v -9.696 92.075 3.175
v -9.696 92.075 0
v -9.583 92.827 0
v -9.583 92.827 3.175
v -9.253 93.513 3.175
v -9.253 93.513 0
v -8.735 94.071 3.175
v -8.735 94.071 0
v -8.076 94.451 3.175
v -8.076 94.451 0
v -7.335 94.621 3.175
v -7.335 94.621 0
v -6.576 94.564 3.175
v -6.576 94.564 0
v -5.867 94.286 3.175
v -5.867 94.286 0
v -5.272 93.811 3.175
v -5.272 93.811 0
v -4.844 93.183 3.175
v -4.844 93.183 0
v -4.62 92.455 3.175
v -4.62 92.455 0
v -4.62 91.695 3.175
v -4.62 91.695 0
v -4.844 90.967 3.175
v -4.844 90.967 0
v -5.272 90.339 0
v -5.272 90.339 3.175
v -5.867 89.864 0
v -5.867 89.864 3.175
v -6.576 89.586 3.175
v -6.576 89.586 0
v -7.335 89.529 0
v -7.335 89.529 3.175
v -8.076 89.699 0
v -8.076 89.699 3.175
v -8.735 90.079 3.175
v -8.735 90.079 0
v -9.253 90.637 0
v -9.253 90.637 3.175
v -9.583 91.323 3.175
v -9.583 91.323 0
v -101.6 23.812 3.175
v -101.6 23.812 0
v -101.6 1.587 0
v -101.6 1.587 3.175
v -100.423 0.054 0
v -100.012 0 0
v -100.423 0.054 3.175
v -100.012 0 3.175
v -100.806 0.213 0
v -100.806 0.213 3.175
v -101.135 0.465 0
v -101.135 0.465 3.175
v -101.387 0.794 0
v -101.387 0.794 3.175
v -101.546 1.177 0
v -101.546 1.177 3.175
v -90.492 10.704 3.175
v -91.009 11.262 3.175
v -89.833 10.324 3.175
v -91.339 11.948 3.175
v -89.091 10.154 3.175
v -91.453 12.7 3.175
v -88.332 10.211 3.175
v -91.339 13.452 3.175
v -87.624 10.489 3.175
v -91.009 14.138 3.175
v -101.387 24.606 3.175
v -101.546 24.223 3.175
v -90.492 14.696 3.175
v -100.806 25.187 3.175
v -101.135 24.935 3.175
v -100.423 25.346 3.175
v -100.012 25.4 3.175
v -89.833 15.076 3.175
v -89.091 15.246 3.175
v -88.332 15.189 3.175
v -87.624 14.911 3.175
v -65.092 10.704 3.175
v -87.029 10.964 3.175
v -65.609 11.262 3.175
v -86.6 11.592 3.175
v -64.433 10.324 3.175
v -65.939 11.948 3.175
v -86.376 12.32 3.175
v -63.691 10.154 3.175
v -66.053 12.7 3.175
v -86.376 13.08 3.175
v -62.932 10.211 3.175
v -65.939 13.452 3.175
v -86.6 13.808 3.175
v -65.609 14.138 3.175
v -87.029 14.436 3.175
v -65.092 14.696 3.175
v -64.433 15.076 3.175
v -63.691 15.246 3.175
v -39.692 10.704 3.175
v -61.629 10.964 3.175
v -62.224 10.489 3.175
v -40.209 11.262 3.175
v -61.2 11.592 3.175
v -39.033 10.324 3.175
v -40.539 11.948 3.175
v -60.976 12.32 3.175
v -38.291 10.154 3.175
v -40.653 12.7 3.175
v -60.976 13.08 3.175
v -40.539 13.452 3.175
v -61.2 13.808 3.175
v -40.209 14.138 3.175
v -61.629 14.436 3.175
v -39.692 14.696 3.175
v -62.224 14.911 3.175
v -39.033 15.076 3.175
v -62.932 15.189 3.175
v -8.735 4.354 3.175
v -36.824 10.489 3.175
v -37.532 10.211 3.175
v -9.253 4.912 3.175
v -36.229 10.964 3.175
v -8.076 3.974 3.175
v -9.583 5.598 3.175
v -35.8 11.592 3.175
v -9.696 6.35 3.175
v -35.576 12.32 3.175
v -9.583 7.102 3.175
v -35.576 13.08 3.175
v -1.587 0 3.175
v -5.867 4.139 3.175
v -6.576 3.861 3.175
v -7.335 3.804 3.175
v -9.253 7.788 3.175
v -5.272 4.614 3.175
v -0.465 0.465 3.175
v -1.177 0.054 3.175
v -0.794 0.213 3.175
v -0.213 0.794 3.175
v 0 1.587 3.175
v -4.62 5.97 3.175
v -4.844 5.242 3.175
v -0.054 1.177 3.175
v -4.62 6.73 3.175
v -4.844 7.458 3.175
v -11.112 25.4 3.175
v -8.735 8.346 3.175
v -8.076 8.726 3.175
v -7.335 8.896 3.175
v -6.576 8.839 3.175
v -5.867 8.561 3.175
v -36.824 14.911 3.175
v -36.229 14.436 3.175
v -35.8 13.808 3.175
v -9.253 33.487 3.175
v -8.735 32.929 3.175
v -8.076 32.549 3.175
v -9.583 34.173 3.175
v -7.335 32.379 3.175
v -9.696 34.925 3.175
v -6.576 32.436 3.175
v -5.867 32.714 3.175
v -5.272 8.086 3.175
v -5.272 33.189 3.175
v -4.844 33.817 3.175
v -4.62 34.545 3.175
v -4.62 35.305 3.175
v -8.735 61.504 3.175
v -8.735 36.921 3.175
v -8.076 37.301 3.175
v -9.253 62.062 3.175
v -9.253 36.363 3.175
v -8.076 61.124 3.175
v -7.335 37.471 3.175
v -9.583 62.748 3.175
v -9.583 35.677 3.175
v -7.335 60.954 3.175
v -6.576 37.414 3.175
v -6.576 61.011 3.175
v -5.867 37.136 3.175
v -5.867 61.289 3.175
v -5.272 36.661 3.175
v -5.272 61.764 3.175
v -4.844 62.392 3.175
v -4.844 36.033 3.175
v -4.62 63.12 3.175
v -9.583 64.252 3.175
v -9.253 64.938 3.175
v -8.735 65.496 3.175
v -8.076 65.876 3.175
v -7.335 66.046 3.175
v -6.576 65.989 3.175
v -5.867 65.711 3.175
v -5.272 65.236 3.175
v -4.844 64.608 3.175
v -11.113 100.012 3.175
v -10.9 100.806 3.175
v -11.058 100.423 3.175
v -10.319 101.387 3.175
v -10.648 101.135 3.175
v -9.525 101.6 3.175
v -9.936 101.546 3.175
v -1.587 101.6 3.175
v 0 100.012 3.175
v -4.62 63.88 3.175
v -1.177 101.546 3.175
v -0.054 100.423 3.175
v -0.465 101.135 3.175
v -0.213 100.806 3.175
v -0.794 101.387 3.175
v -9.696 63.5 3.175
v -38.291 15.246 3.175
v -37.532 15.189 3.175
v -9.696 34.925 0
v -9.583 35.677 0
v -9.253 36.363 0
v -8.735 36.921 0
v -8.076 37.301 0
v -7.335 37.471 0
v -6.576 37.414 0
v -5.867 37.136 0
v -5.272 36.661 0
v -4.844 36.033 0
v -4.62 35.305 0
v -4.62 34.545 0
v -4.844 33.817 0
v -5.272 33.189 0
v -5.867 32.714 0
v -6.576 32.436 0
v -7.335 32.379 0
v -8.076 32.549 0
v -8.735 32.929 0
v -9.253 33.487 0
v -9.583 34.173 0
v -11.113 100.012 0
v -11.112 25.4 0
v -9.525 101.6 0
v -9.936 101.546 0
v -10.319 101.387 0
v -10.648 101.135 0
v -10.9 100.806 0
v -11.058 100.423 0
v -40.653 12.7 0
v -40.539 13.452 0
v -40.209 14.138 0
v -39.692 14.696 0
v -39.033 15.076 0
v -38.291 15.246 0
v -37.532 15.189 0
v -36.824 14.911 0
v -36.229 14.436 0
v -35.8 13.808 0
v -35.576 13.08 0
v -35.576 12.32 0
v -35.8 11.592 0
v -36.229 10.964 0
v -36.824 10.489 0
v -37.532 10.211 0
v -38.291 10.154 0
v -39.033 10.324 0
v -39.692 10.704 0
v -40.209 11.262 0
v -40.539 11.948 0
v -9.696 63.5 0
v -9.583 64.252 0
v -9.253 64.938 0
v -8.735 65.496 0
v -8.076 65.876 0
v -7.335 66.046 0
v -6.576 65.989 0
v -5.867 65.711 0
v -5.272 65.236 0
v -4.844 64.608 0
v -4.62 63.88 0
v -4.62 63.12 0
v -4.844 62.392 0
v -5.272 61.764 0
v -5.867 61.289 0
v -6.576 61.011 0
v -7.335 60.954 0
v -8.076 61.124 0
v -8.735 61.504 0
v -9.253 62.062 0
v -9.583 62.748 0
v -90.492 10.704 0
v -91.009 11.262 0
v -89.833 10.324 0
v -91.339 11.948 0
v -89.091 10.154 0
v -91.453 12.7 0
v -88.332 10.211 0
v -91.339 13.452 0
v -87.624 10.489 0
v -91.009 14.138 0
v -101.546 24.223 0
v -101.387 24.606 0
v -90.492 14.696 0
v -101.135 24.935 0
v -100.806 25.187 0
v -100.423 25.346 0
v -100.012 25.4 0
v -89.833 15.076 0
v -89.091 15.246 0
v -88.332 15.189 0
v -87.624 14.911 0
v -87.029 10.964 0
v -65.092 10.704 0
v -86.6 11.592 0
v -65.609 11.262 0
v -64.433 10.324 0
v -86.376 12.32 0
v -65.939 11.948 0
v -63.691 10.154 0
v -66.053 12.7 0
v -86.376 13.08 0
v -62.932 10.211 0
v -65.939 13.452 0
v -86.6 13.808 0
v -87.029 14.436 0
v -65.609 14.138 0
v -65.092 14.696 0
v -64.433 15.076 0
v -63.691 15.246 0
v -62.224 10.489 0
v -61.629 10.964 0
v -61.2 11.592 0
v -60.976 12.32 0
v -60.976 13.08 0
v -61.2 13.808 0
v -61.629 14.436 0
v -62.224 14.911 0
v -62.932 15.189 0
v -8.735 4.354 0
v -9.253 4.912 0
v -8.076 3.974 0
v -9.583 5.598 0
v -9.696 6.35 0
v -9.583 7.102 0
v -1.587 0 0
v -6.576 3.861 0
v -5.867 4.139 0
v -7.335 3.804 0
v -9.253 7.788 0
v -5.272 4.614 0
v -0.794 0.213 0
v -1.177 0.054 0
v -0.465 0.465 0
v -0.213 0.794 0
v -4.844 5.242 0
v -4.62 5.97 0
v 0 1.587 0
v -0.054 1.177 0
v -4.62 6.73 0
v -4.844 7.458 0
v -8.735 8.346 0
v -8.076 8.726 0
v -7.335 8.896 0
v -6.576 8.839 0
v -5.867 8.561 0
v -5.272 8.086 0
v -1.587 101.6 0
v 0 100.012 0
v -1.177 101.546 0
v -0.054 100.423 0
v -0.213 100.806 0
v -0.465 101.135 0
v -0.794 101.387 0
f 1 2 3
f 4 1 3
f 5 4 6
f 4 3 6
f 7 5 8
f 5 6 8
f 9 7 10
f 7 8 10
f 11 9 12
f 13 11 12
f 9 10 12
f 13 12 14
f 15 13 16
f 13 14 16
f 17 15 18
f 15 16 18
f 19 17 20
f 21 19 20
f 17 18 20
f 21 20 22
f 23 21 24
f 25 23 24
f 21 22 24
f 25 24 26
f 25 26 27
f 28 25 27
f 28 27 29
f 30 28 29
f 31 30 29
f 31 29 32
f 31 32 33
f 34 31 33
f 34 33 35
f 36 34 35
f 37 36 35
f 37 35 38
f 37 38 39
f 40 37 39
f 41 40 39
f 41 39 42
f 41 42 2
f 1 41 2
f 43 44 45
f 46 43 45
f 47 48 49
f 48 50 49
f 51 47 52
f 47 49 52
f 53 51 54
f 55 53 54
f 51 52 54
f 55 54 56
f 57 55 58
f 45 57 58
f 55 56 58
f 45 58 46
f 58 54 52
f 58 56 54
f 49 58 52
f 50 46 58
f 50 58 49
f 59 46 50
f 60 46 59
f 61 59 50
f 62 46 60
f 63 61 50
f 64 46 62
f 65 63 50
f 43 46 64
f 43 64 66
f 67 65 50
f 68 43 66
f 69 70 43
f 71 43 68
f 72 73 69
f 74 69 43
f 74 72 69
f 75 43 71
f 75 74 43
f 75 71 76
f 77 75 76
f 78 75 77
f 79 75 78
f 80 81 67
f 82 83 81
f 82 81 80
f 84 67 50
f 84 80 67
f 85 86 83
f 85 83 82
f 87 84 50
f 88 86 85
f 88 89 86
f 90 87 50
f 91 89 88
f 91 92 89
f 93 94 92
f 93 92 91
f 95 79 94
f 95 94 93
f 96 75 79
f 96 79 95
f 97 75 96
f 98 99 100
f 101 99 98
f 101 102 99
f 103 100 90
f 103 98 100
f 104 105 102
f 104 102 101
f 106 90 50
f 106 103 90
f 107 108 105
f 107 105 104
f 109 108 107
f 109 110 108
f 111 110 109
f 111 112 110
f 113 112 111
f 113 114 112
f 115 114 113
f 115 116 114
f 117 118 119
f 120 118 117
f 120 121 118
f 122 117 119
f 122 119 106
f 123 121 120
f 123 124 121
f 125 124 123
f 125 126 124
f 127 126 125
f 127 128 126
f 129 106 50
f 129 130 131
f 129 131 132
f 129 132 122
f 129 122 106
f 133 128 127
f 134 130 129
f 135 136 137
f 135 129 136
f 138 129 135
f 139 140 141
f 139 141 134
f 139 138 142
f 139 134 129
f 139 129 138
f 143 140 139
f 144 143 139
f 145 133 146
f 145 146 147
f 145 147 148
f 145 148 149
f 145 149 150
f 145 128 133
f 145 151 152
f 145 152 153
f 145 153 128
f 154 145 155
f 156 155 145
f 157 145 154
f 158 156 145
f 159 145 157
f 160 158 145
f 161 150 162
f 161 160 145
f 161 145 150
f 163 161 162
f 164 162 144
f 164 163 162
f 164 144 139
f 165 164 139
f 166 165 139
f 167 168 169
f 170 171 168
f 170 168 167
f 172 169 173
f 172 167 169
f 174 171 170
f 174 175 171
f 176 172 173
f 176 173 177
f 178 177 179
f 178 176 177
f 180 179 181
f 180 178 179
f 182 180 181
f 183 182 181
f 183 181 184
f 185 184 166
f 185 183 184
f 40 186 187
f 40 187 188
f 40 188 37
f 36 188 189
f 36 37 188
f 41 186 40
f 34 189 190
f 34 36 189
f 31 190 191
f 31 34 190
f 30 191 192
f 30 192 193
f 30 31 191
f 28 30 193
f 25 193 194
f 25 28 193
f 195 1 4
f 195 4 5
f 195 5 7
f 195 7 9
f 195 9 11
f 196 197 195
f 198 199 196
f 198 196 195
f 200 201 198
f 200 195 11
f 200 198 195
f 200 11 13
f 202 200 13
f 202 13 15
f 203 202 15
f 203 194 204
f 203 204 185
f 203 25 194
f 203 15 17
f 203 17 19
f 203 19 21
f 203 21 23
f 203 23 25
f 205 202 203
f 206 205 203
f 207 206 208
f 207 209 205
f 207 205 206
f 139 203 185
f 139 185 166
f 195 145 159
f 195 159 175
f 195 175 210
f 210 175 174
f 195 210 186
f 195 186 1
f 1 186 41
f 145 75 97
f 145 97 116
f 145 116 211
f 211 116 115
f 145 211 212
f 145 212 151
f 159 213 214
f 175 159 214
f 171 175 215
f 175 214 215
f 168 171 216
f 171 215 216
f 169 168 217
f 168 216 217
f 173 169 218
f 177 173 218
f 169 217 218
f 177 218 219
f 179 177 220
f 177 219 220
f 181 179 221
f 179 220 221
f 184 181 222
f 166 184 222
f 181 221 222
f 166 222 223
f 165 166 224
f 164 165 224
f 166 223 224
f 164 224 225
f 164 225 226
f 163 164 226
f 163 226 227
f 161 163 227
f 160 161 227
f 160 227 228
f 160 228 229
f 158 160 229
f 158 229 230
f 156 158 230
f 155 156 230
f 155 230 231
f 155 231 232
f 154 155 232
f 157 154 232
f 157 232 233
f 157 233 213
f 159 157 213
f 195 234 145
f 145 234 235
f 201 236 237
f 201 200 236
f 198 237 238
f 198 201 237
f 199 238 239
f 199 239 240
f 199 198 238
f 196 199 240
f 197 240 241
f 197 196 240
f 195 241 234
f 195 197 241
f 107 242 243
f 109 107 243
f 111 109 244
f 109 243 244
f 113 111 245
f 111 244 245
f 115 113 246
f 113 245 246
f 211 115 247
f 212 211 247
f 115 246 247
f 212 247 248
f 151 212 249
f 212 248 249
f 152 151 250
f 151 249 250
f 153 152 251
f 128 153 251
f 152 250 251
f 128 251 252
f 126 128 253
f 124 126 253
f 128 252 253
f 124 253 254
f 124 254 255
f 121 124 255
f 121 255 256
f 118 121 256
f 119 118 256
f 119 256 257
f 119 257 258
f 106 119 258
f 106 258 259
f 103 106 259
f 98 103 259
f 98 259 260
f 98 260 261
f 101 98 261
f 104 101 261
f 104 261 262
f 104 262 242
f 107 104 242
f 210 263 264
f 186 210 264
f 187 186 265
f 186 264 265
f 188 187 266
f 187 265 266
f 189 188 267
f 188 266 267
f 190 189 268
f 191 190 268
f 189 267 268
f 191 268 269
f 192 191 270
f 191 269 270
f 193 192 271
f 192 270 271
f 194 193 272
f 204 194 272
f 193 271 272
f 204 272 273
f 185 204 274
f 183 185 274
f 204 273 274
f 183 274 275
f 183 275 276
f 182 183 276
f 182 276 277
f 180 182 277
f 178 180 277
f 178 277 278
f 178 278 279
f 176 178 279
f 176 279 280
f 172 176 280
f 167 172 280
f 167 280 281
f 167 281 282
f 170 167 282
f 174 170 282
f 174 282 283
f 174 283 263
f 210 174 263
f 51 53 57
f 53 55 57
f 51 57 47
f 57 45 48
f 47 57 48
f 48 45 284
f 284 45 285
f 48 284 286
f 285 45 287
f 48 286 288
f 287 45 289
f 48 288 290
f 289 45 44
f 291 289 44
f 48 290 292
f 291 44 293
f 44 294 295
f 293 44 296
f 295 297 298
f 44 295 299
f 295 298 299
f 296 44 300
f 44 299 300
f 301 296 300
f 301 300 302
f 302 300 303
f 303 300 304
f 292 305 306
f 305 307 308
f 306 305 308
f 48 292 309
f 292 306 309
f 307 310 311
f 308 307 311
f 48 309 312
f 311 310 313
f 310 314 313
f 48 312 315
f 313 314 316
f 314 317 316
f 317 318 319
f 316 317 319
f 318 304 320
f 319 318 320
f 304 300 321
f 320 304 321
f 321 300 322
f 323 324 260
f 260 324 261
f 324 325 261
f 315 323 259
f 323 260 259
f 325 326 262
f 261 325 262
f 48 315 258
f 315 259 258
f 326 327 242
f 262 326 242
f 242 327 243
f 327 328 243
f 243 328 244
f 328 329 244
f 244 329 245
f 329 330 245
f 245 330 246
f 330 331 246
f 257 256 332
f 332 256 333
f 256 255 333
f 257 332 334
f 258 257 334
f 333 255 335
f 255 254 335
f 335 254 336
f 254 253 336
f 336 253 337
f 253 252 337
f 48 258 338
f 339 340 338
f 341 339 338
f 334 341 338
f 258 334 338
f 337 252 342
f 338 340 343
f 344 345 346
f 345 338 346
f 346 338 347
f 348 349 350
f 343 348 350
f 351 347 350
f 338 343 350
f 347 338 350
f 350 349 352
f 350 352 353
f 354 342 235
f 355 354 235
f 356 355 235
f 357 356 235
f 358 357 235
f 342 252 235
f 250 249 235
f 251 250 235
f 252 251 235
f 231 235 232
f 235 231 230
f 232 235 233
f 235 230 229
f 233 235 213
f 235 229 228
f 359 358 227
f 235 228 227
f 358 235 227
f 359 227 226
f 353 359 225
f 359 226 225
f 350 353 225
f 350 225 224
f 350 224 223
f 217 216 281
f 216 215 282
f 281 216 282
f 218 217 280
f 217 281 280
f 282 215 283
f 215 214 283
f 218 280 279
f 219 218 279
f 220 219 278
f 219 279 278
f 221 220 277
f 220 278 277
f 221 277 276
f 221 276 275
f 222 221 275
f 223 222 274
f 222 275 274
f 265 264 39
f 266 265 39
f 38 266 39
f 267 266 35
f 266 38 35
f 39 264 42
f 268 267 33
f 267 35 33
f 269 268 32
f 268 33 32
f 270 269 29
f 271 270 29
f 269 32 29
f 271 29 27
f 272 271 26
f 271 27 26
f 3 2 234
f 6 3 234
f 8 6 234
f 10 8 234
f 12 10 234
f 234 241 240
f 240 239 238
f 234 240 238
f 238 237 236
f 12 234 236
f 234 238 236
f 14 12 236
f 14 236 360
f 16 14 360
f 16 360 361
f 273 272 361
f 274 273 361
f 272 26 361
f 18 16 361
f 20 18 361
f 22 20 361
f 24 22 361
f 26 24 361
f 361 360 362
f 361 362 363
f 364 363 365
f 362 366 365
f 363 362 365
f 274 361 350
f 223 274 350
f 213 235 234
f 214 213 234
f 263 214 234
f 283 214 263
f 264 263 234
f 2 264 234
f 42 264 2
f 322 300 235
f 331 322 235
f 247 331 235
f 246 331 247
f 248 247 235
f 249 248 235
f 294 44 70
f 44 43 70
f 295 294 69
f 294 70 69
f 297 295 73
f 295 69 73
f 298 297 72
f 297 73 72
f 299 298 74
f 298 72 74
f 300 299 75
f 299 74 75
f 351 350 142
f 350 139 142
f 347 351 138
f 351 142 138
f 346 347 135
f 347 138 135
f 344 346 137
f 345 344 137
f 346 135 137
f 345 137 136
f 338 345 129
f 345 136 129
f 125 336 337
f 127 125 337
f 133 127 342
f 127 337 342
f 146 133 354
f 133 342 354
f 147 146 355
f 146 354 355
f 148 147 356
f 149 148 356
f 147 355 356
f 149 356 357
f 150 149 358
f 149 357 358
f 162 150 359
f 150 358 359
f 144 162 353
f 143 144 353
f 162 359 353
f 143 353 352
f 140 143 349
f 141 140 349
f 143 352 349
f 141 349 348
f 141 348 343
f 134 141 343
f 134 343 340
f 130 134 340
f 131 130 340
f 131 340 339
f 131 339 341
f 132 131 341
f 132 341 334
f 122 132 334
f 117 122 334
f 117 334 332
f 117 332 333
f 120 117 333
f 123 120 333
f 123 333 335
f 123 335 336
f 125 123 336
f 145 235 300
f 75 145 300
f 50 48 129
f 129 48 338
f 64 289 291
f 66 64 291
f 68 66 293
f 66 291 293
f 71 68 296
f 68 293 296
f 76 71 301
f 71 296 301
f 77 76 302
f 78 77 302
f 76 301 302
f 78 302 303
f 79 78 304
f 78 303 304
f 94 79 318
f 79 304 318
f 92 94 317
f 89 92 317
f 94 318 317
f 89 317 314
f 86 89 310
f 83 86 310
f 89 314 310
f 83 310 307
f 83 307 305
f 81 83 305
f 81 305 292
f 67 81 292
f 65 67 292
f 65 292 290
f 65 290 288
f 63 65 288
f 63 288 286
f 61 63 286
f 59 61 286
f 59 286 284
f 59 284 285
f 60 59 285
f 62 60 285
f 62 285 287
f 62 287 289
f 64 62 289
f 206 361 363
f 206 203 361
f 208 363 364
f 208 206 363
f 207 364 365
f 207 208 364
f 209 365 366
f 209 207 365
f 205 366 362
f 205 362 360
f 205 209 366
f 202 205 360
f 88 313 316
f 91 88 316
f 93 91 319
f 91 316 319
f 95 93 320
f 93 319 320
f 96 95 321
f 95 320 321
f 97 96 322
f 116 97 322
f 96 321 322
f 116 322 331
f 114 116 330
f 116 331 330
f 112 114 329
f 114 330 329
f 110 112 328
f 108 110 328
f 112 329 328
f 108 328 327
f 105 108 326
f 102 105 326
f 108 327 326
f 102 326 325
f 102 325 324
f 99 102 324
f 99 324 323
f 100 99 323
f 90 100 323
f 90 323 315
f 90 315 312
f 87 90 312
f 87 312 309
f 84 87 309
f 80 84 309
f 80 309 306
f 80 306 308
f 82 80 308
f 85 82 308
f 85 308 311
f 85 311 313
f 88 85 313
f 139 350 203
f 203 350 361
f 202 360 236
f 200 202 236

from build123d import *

# Parameters (mm, degrees)
BOSS_EXTRUDE1_DEPTH    = 3.175
F_10_CLEARANCE_HOLE1_D = 5.1054
F_10_CLEARANCE_HOLE2_D = 5.1054
FILLET1_R              = 1.5875


with BuildPart() as part:
    # Sketch1 → Boss-Extrude1 (new body)
    with BuildSketch(Plane.XY):
        Polygon((0, 0), (0, 101.6), (-11.1125, 101.6), (-11.1125, 25.4), (-101.6, 25.4), (-101.6, 0), align=None)
    extrude(amount=BOSS_EXTRUDE1_DEPTH)

    # #10 Clearance Hole1 (through all)
    with Locations(Plane.XY.offset(3.175)):
        with Locations((-7.14375, 6.35), (-7.14375, 34.925), (-7.14375, 63.5), (-7.14375, 92.075)):
            Hole(F_10_CLEARANCE_HOLE1_D / 2)

    # #10 Clearance Hole2 (through all)
    with Locations(Plane.XY.offset(3.175)):
        with Locations((-88.9, 12.7), (-38.1, 12.7), (-63.5, 12.7)):
            Hole(F_10_CLEARANCE_HOLE2_D / 2)

    # Fillet1
    fillet1_edges = [part.edges().sort_by_distance(p)[0] for p in [
        (-101.6, 0, 1.5875),
        (-101.6, 25.4, 1.5875),
        (-11.1125, 101.6, 1.5875),
        (0, 101.6, 1.5875),
        (0, 0, 1.5875),
    ]]
    fillet(fillet1_edges, radius=FILLET1_R)


solid = part.part
